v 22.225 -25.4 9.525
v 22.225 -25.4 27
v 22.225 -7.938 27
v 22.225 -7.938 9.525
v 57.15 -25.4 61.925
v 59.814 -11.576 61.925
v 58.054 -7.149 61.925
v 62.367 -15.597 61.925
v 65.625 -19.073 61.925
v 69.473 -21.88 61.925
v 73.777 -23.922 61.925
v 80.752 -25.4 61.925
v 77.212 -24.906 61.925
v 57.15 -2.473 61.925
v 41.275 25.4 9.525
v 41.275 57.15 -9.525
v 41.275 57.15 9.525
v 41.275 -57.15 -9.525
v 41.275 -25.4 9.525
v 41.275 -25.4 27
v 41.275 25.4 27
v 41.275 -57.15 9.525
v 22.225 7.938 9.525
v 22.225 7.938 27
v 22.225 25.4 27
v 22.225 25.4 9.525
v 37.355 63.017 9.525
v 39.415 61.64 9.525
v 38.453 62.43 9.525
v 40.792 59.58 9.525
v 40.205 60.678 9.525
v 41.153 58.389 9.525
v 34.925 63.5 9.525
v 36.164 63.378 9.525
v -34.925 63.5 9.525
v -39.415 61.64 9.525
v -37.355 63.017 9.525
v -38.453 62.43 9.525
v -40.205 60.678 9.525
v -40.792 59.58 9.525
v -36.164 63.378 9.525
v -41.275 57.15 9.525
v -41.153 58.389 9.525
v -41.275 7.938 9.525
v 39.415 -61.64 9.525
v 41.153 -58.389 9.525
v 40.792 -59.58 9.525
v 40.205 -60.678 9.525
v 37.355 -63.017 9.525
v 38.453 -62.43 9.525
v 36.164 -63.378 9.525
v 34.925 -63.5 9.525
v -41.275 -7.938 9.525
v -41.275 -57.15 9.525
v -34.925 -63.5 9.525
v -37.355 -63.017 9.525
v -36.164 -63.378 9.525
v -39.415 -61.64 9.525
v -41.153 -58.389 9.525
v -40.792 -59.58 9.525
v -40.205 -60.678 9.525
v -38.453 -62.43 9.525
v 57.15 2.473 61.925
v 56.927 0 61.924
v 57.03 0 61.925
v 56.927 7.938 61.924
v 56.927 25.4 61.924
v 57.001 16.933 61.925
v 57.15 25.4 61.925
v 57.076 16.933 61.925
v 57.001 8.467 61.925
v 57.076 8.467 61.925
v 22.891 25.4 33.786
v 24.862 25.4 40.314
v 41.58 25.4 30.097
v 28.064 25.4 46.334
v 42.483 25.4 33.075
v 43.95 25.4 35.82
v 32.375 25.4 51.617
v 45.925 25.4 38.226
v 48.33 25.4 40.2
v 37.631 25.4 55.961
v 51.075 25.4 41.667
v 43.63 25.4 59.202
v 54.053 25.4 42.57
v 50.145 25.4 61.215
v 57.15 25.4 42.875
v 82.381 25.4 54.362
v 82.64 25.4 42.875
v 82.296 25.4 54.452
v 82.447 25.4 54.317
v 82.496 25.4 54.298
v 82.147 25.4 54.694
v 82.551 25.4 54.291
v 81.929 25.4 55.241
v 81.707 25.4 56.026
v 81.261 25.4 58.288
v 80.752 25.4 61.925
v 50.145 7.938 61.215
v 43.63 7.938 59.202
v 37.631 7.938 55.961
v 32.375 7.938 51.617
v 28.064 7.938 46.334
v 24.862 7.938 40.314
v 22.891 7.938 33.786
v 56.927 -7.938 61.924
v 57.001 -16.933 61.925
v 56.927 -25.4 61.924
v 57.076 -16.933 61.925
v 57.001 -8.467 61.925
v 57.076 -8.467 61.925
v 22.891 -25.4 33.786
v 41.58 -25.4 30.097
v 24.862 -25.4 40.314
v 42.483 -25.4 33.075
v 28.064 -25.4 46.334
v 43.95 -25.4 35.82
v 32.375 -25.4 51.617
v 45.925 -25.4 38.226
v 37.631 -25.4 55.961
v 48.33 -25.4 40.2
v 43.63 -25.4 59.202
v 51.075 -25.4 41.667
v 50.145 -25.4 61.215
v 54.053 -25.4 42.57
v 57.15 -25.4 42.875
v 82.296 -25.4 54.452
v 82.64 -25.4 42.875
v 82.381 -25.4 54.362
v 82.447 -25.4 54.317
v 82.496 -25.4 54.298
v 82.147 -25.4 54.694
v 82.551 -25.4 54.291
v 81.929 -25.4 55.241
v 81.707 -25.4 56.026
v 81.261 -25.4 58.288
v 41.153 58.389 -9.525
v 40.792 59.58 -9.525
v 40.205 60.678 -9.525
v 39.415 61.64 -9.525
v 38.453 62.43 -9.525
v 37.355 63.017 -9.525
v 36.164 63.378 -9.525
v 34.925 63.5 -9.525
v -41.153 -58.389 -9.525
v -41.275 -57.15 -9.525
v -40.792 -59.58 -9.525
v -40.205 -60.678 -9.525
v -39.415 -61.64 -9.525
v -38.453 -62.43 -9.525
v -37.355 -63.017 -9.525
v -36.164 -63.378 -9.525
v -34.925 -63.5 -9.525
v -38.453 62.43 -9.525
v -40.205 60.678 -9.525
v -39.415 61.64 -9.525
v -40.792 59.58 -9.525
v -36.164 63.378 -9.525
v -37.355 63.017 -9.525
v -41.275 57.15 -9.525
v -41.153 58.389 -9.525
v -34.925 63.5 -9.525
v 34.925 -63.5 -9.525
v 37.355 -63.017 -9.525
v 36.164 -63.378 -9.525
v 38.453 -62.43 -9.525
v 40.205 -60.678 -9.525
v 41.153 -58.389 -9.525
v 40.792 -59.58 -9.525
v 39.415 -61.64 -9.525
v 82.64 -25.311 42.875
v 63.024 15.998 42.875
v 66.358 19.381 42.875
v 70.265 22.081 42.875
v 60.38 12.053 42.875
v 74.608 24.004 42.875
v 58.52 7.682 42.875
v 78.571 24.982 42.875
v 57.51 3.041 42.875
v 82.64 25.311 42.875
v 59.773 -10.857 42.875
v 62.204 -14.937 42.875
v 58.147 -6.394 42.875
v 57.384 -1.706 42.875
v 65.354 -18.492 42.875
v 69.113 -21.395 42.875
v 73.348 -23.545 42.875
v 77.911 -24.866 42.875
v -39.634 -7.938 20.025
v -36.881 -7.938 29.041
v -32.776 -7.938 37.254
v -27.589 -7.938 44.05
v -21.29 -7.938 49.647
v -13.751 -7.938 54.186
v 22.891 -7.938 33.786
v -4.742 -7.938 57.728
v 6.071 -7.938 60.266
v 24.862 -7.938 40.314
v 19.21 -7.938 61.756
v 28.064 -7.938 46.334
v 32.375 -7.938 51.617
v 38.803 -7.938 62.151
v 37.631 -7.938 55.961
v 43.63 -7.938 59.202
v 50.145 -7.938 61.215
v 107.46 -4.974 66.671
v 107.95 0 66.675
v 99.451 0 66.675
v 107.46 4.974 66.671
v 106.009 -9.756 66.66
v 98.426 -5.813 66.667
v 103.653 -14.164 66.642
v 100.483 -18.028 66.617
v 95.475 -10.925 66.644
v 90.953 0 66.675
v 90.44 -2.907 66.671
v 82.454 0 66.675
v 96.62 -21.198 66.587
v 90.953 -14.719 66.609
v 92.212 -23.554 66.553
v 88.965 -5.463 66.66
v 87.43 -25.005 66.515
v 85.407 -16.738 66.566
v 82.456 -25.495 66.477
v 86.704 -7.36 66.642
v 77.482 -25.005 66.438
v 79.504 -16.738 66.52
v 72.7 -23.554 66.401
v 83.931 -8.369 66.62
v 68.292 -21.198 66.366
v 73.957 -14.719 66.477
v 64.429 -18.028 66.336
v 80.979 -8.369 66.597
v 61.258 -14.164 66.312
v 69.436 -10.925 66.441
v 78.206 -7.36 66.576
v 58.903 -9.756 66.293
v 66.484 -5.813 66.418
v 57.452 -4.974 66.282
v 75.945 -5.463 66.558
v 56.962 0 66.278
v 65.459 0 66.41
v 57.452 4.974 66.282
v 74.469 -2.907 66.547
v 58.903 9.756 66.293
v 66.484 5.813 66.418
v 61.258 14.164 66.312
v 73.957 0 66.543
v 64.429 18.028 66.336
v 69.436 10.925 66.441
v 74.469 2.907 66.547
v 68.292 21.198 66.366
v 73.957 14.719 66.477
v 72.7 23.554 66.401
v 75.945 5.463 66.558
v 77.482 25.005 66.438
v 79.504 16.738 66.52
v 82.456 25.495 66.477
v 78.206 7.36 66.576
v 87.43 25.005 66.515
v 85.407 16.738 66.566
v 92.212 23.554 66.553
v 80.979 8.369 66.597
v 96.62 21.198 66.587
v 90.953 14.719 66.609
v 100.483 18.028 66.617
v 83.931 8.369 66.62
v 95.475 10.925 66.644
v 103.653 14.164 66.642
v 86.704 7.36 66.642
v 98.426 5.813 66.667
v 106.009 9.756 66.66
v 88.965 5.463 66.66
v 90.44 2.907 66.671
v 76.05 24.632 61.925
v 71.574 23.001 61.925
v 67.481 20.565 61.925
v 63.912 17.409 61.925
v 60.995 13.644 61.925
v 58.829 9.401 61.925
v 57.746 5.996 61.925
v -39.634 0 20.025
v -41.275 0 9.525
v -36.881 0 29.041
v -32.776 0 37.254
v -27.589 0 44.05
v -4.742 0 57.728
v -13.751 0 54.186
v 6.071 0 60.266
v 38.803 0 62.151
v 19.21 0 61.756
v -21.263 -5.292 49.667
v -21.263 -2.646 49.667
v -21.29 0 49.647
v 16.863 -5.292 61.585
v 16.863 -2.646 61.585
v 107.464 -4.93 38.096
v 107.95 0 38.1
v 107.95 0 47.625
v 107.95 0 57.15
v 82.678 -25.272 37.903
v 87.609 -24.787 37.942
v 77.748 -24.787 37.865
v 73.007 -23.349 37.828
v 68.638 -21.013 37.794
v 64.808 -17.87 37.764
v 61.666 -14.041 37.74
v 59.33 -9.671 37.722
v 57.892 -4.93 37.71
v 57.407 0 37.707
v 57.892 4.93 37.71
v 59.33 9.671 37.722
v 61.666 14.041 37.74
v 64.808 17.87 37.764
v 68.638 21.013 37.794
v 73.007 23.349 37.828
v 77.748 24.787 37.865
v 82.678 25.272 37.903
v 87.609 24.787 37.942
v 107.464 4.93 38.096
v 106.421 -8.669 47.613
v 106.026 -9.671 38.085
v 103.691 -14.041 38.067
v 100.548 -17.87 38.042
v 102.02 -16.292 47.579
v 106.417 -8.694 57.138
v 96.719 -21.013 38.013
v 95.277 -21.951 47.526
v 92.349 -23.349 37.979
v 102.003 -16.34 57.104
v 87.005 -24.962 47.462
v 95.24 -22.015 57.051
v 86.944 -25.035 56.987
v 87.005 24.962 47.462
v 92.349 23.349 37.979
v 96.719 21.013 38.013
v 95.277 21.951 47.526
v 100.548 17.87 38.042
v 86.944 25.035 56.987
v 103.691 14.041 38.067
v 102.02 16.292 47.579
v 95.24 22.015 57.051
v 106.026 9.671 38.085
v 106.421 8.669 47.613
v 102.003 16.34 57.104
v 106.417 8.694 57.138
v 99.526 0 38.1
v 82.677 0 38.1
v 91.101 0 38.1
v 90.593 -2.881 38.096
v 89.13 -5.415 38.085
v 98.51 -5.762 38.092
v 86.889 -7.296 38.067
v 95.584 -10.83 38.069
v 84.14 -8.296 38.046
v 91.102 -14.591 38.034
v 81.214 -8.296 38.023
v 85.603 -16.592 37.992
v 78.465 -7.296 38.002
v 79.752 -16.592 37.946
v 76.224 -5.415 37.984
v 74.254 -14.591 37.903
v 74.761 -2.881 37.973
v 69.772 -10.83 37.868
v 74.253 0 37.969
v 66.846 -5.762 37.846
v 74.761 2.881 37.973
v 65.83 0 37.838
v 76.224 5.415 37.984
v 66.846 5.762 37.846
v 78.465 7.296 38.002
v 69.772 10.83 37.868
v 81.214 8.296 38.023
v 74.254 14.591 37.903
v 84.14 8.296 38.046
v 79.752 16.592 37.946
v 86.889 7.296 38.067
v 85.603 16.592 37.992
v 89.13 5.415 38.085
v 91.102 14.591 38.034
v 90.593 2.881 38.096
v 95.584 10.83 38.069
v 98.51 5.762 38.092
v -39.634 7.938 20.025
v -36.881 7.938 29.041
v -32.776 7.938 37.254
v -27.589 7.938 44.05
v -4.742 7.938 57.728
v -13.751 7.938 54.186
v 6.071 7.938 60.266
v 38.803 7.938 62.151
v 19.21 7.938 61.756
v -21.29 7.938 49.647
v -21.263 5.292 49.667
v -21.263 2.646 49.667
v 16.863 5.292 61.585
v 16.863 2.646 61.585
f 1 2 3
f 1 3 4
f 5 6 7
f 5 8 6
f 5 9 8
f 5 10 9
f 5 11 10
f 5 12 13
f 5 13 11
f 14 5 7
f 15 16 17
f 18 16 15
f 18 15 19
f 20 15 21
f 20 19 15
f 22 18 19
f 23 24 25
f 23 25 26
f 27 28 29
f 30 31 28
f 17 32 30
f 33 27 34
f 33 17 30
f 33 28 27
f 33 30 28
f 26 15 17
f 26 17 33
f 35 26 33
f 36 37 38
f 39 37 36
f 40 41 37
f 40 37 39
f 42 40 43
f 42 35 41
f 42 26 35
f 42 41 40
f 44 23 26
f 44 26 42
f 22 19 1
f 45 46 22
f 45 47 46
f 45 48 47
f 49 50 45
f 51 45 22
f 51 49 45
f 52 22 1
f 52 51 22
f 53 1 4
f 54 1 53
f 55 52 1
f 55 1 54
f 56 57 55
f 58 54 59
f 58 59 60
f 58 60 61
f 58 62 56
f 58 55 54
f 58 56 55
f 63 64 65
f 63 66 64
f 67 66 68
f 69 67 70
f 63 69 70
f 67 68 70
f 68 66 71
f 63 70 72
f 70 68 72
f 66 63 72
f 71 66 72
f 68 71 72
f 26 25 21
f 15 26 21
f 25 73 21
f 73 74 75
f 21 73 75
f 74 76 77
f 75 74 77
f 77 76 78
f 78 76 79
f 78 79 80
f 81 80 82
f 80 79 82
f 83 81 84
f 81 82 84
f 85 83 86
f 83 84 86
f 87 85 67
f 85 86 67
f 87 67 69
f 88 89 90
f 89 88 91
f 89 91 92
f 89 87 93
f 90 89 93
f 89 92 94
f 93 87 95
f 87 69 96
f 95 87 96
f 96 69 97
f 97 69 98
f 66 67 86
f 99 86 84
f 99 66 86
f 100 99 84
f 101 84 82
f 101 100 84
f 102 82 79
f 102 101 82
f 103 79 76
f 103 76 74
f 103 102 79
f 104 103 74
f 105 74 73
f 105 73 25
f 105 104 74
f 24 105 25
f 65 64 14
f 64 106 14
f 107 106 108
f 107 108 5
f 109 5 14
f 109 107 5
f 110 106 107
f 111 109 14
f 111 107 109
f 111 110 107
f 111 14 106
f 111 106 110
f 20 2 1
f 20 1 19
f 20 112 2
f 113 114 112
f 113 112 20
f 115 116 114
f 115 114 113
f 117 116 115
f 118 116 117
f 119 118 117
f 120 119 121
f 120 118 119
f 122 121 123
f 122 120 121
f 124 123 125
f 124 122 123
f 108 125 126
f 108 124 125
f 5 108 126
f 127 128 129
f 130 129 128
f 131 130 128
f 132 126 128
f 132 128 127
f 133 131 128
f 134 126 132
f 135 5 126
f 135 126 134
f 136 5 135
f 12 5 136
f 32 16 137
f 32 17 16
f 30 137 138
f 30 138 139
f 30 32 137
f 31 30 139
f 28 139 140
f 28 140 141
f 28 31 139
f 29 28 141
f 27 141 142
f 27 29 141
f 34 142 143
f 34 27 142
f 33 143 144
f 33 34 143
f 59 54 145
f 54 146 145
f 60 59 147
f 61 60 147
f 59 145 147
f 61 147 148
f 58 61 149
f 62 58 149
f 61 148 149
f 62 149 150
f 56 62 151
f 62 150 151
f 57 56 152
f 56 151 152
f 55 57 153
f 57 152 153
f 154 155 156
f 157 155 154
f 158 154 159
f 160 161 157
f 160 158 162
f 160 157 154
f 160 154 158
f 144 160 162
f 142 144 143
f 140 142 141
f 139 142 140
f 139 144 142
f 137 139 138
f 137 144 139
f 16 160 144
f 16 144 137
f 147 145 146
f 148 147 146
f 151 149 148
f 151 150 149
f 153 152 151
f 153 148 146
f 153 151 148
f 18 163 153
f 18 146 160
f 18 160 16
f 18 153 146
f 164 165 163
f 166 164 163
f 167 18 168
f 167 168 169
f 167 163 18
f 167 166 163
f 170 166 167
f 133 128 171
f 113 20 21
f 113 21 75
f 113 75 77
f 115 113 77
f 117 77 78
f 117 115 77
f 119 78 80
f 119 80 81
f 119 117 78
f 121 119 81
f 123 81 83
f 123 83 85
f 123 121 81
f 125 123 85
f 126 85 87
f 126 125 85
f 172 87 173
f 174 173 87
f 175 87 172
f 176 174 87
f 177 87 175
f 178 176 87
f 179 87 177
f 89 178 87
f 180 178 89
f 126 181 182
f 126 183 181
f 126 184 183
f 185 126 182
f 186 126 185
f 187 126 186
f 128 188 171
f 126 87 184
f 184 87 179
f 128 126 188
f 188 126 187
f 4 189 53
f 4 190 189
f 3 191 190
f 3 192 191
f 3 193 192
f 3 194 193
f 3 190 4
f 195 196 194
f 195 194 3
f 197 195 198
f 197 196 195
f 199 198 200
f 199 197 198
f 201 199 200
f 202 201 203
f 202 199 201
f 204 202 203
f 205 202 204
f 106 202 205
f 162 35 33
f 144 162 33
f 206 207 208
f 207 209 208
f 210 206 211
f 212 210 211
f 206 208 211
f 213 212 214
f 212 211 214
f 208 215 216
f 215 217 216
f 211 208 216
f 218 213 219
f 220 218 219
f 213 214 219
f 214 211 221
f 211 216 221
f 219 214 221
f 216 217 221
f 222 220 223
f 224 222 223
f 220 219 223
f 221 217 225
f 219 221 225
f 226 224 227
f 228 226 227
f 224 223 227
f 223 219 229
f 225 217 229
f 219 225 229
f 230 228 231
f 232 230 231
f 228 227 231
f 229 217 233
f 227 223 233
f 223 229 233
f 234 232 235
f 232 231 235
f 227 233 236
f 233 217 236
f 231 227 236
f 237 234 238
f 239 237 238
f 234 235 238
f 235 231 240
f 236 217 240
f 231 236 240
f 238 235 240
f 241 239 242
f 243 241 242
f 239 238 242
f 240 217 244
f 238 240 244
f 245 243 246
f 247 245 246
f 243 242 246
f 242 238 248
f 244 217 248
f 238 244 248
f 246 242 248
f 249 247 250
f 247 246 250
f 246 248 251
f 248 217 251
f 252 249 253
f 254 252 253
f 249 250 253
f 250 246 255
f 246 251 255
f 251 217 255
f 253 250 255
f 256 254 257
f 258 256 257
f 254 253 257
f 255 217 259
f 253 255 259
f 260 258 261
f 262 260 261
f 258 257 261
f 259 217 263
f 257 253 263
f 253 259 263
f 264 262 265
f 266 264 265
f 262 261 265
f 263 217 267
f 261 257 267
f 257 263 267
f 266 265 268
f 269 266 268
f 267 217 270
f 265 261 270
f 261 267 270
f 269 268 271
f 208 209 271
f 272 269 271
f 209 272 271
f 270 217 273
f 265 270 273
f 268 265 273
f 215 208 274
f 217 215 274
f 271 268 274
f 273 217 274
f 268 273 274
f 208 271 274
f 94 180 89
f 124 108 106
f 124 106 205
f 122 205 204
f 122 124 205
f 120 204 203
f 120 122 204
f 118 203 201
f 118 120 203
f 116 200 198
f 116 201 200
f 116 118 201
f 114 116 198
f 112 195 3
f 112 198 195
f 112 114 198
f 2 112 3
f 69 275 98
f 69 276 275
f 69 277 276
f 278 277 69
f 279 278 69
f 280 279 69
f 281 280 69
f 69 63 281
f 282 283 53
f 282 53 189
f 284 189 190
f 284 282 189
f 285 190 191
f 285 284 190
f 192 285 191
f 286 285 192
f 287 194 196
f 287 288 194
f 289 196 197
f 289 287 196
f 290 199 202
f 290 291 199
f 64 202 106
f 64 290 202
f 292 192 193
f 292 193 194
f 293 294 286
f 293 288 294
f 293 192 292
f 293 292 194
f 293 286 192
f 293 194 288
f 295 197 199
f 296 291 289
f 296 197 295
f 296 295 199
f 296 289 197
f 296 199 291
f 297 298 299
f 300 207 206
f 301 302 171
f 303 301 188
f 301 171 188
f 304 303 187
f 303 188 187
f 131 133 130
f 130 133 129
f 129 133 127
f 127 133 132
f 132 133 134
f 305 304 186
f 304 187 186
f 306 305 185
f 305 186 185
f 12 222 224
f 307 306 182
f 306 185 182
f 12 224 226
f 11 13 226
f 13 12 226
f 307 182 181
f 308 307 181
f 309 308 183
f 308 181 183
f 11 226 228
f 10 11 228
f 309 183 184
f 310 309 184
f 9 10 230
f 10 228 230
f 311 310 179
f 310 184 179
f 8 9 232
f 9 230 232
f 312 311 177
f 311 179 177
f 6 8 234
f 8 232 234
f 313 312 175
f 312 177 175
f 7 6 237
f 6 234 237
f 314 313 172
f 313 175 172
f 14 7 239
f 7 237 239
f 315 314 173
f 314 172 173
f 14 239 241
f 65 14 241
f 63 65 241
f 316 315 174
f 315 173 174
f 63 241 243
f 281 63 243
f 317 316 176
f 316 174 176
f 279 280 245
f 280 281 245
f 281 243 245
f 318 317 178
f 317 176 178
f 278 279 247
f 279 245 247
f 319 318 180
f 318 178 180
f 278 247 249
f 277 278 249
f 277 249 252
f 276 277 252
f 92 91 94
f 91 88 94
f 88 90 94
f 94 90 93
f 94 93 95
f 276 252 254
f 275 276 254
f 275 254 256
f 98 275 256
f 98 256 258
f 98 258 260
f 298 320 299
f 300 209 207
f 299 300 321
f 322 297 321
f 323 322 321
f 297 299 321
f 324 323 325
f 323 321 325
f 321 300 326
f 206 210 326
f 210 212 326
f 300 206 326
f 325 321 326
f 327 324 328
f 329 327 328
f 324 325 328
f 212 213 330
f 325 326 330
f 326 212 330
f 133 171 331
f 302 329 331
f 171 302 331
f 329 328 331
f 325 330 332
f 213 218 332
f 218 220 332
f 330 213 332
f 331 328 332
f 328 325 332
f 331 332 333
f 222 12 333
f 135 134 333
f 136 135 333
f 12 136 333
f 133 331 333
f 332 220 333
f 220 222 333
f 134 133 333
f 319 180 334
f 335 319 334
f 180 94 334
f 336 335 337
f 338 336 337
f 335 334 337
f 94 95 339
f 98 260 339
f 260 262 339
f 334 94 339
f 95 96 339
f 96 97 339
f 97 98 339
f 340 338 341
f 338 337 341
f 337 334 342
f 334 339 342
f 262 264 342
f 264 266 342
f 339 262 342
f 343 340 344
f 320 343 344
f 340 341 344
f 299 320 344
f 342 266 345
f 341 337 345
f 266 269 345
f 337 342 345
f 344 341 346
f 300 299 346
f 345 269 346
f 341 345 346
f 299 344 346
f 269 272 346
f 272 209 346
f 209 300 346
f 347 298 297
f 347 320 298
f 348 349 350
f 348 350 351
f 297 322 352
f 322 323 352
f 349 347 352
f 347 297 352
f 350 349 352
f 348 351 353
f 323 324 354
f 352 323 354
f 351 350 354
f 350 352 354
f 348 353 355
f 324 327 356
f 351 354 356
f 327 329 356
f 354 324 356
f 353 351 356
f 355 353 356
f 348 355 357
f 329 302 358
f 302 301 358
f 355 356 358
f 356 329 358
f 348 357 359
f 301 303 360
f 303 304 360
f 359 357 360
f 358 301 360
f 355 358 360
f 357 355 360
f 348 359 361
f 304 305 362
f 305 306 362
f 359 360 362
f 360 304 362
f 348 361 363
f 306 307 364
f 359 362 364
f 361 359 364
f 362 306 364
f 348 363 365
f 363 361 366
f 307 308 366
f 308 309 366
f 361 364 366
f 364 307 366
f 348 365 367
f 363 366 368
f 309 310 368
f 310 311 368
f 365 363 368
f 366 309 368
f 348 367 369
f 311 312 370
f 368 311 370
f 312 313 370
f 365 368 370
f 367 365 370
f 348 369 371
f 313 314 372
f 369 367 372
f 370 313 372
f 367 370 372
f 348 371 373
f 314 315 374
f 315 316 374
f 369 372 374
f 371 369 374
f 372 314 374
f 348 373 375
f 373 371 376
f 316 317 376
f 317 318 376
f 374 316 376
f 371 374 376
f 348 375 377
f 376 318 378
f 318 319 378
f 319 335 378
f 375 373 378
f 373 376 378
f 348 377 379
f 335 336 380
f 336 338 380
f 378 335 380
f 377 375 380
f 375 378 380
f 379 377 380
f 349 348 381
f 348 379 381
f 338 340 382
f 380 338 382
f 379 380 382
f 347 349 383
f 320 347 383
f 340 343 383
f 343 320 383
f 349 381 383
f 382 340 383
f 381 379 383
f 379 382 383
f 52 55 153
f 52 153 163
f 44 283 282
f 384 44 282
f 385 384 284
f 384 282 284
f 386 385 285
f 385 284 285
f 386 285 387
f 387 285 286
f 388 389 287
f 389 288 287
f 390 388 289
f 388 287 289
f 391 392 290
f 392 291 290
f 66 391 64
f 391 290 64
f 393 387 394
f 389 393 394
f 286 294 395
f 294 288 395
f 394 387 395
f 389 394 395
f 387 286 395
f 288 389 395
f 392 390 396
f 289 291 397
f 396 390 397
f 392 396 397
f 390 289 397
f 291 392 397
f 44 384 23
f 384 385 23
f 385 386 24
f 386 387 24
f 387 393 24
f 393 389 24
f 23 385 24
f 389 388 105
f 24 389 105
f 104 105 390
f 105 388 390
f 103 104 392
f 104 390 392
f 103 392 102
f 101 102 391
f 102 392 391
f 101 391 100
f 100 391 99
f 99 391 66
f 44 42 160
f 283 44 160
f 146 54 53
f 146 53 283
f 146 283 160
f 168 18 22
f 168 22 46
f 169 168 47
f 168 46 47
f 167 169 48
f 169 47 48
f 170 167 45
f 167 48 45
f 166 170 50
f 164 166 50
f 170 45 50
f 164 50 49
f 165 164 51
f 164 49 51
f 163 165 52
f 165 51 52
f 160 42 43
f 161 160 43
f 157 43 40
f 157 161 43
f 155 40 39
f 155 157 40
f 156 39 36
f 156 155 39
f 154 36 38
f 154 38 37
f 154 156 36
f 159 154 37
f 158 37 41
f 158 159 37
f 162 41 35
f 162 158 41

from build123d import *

# Parameters (mm, degrees)
F1_DEPTH = 63.5
F2_DEPTH = 25.4
F3_DEPTH = 7.9375
F5_R     = 6.35


with BuildPart() as f1:
    # F0 (on Front) → F1 (new body, symmetric)
    with BuildSketch(Plane.XZ):
        Polygon((41.275, -9.525), (41.275, 9.525), (22.225, 9.525), (-41.275, 9.525), (-41.275, -9.525), align=None)
    extrude(amount=F1_DEPTH, both=True)

    # F0 (on Front) → F2 (join, symmetric)
    with BuildSketch(Plane.XZ):
        with BuildLine():
            Line((22.225, 9.525), (41.275, 9.525))
            Line((41.275, 9.525), (41.275, 27.0002))
            ThreePointArc((41.275, 27.0002), (45.9246798487, 38.2255201513), (57.15, 42.8752))
            Line((57.15, 42.8752), (57.15, 61.9252))
            add(Edge.make_bspline(
                [(56.9266506974, 61.9244858207), (57.001194094, 61.9246904131), (57.0756440835, 61.9249282445), (57.15, 61.9252)],
                knots=[111.2718154364, 111.2718154364, 111.2718154364, 111.2718154364, 111.5045361635, 111.5045361635, 111.5045361635, 111.5045361635], degree=3))
            ThreePointArc((56.9266506974, 61.9244858207), (32.3754556107, 51.6168117754), (22.225, 27.0002))
            Line((22.225, 27.0002), (22.225, 9.525))
        make_face()
        Polygon((57.15, 61.9252), (57.15, 42.8752), (82.639603816, 42.8752), (82.4913637761, 61.9252), align=None)
    extrude(amount=F2_DEPTH, both=True)

    # F0 (on Front) → F3 (join, symmetric)
    with BuildSketch(Plane.XZ):
        with BuildLine():
            Line((-41.275, 9.525), (22.225, 9.525))
            Line((22.225, 9.525), (22.225, 27.0002))
            ThreePointArc((22.225, 27.0002), (32.3754556107, 51.6168117754), (56.9266506974, 61.9244858207))
            add(Edge.make_bspline(
                [(-41.275, 9.525), (-35.7109377895, 69.3276862996), (21.2848788051, 61.8266631405), (56.9266506974, 61.9244858207)],
                knots=[0, 0, 0, 0, 111.2718154364, 111.2718154364, 111.2718154364, 111.2718154364], degree=3))
        make_face()
    extrude(amount=F3_DEPTH, both=True)

    # F0 (on Front) → F4 (revolve)
    with BuildSketch(Plane.XZ):
        Polygon((82.4913637761, 61.9252), (82.639603816, 42.8752), (82.6767626526, 38.1), (107.95, 38.1), (107.95, 66.675), (82.4544025928, 66.675), align=None)
    revolve(axis=Axis((82.5655826227, 0, 52.3875), (0.0077813938, 0, -0.9999697245)))

    # F5
    f5_edges = [f1.edges().sort_by_distance(p)[0] for p in [
        (41.275, -63.5, 0),
        (-41.275, -63.5, 0),
        (41.275, 63.5, 0),
        (-41.275, 63.5, 0),
    ]]
    fillet(f5_edges, radius=F5_R)


solid = f1.part
